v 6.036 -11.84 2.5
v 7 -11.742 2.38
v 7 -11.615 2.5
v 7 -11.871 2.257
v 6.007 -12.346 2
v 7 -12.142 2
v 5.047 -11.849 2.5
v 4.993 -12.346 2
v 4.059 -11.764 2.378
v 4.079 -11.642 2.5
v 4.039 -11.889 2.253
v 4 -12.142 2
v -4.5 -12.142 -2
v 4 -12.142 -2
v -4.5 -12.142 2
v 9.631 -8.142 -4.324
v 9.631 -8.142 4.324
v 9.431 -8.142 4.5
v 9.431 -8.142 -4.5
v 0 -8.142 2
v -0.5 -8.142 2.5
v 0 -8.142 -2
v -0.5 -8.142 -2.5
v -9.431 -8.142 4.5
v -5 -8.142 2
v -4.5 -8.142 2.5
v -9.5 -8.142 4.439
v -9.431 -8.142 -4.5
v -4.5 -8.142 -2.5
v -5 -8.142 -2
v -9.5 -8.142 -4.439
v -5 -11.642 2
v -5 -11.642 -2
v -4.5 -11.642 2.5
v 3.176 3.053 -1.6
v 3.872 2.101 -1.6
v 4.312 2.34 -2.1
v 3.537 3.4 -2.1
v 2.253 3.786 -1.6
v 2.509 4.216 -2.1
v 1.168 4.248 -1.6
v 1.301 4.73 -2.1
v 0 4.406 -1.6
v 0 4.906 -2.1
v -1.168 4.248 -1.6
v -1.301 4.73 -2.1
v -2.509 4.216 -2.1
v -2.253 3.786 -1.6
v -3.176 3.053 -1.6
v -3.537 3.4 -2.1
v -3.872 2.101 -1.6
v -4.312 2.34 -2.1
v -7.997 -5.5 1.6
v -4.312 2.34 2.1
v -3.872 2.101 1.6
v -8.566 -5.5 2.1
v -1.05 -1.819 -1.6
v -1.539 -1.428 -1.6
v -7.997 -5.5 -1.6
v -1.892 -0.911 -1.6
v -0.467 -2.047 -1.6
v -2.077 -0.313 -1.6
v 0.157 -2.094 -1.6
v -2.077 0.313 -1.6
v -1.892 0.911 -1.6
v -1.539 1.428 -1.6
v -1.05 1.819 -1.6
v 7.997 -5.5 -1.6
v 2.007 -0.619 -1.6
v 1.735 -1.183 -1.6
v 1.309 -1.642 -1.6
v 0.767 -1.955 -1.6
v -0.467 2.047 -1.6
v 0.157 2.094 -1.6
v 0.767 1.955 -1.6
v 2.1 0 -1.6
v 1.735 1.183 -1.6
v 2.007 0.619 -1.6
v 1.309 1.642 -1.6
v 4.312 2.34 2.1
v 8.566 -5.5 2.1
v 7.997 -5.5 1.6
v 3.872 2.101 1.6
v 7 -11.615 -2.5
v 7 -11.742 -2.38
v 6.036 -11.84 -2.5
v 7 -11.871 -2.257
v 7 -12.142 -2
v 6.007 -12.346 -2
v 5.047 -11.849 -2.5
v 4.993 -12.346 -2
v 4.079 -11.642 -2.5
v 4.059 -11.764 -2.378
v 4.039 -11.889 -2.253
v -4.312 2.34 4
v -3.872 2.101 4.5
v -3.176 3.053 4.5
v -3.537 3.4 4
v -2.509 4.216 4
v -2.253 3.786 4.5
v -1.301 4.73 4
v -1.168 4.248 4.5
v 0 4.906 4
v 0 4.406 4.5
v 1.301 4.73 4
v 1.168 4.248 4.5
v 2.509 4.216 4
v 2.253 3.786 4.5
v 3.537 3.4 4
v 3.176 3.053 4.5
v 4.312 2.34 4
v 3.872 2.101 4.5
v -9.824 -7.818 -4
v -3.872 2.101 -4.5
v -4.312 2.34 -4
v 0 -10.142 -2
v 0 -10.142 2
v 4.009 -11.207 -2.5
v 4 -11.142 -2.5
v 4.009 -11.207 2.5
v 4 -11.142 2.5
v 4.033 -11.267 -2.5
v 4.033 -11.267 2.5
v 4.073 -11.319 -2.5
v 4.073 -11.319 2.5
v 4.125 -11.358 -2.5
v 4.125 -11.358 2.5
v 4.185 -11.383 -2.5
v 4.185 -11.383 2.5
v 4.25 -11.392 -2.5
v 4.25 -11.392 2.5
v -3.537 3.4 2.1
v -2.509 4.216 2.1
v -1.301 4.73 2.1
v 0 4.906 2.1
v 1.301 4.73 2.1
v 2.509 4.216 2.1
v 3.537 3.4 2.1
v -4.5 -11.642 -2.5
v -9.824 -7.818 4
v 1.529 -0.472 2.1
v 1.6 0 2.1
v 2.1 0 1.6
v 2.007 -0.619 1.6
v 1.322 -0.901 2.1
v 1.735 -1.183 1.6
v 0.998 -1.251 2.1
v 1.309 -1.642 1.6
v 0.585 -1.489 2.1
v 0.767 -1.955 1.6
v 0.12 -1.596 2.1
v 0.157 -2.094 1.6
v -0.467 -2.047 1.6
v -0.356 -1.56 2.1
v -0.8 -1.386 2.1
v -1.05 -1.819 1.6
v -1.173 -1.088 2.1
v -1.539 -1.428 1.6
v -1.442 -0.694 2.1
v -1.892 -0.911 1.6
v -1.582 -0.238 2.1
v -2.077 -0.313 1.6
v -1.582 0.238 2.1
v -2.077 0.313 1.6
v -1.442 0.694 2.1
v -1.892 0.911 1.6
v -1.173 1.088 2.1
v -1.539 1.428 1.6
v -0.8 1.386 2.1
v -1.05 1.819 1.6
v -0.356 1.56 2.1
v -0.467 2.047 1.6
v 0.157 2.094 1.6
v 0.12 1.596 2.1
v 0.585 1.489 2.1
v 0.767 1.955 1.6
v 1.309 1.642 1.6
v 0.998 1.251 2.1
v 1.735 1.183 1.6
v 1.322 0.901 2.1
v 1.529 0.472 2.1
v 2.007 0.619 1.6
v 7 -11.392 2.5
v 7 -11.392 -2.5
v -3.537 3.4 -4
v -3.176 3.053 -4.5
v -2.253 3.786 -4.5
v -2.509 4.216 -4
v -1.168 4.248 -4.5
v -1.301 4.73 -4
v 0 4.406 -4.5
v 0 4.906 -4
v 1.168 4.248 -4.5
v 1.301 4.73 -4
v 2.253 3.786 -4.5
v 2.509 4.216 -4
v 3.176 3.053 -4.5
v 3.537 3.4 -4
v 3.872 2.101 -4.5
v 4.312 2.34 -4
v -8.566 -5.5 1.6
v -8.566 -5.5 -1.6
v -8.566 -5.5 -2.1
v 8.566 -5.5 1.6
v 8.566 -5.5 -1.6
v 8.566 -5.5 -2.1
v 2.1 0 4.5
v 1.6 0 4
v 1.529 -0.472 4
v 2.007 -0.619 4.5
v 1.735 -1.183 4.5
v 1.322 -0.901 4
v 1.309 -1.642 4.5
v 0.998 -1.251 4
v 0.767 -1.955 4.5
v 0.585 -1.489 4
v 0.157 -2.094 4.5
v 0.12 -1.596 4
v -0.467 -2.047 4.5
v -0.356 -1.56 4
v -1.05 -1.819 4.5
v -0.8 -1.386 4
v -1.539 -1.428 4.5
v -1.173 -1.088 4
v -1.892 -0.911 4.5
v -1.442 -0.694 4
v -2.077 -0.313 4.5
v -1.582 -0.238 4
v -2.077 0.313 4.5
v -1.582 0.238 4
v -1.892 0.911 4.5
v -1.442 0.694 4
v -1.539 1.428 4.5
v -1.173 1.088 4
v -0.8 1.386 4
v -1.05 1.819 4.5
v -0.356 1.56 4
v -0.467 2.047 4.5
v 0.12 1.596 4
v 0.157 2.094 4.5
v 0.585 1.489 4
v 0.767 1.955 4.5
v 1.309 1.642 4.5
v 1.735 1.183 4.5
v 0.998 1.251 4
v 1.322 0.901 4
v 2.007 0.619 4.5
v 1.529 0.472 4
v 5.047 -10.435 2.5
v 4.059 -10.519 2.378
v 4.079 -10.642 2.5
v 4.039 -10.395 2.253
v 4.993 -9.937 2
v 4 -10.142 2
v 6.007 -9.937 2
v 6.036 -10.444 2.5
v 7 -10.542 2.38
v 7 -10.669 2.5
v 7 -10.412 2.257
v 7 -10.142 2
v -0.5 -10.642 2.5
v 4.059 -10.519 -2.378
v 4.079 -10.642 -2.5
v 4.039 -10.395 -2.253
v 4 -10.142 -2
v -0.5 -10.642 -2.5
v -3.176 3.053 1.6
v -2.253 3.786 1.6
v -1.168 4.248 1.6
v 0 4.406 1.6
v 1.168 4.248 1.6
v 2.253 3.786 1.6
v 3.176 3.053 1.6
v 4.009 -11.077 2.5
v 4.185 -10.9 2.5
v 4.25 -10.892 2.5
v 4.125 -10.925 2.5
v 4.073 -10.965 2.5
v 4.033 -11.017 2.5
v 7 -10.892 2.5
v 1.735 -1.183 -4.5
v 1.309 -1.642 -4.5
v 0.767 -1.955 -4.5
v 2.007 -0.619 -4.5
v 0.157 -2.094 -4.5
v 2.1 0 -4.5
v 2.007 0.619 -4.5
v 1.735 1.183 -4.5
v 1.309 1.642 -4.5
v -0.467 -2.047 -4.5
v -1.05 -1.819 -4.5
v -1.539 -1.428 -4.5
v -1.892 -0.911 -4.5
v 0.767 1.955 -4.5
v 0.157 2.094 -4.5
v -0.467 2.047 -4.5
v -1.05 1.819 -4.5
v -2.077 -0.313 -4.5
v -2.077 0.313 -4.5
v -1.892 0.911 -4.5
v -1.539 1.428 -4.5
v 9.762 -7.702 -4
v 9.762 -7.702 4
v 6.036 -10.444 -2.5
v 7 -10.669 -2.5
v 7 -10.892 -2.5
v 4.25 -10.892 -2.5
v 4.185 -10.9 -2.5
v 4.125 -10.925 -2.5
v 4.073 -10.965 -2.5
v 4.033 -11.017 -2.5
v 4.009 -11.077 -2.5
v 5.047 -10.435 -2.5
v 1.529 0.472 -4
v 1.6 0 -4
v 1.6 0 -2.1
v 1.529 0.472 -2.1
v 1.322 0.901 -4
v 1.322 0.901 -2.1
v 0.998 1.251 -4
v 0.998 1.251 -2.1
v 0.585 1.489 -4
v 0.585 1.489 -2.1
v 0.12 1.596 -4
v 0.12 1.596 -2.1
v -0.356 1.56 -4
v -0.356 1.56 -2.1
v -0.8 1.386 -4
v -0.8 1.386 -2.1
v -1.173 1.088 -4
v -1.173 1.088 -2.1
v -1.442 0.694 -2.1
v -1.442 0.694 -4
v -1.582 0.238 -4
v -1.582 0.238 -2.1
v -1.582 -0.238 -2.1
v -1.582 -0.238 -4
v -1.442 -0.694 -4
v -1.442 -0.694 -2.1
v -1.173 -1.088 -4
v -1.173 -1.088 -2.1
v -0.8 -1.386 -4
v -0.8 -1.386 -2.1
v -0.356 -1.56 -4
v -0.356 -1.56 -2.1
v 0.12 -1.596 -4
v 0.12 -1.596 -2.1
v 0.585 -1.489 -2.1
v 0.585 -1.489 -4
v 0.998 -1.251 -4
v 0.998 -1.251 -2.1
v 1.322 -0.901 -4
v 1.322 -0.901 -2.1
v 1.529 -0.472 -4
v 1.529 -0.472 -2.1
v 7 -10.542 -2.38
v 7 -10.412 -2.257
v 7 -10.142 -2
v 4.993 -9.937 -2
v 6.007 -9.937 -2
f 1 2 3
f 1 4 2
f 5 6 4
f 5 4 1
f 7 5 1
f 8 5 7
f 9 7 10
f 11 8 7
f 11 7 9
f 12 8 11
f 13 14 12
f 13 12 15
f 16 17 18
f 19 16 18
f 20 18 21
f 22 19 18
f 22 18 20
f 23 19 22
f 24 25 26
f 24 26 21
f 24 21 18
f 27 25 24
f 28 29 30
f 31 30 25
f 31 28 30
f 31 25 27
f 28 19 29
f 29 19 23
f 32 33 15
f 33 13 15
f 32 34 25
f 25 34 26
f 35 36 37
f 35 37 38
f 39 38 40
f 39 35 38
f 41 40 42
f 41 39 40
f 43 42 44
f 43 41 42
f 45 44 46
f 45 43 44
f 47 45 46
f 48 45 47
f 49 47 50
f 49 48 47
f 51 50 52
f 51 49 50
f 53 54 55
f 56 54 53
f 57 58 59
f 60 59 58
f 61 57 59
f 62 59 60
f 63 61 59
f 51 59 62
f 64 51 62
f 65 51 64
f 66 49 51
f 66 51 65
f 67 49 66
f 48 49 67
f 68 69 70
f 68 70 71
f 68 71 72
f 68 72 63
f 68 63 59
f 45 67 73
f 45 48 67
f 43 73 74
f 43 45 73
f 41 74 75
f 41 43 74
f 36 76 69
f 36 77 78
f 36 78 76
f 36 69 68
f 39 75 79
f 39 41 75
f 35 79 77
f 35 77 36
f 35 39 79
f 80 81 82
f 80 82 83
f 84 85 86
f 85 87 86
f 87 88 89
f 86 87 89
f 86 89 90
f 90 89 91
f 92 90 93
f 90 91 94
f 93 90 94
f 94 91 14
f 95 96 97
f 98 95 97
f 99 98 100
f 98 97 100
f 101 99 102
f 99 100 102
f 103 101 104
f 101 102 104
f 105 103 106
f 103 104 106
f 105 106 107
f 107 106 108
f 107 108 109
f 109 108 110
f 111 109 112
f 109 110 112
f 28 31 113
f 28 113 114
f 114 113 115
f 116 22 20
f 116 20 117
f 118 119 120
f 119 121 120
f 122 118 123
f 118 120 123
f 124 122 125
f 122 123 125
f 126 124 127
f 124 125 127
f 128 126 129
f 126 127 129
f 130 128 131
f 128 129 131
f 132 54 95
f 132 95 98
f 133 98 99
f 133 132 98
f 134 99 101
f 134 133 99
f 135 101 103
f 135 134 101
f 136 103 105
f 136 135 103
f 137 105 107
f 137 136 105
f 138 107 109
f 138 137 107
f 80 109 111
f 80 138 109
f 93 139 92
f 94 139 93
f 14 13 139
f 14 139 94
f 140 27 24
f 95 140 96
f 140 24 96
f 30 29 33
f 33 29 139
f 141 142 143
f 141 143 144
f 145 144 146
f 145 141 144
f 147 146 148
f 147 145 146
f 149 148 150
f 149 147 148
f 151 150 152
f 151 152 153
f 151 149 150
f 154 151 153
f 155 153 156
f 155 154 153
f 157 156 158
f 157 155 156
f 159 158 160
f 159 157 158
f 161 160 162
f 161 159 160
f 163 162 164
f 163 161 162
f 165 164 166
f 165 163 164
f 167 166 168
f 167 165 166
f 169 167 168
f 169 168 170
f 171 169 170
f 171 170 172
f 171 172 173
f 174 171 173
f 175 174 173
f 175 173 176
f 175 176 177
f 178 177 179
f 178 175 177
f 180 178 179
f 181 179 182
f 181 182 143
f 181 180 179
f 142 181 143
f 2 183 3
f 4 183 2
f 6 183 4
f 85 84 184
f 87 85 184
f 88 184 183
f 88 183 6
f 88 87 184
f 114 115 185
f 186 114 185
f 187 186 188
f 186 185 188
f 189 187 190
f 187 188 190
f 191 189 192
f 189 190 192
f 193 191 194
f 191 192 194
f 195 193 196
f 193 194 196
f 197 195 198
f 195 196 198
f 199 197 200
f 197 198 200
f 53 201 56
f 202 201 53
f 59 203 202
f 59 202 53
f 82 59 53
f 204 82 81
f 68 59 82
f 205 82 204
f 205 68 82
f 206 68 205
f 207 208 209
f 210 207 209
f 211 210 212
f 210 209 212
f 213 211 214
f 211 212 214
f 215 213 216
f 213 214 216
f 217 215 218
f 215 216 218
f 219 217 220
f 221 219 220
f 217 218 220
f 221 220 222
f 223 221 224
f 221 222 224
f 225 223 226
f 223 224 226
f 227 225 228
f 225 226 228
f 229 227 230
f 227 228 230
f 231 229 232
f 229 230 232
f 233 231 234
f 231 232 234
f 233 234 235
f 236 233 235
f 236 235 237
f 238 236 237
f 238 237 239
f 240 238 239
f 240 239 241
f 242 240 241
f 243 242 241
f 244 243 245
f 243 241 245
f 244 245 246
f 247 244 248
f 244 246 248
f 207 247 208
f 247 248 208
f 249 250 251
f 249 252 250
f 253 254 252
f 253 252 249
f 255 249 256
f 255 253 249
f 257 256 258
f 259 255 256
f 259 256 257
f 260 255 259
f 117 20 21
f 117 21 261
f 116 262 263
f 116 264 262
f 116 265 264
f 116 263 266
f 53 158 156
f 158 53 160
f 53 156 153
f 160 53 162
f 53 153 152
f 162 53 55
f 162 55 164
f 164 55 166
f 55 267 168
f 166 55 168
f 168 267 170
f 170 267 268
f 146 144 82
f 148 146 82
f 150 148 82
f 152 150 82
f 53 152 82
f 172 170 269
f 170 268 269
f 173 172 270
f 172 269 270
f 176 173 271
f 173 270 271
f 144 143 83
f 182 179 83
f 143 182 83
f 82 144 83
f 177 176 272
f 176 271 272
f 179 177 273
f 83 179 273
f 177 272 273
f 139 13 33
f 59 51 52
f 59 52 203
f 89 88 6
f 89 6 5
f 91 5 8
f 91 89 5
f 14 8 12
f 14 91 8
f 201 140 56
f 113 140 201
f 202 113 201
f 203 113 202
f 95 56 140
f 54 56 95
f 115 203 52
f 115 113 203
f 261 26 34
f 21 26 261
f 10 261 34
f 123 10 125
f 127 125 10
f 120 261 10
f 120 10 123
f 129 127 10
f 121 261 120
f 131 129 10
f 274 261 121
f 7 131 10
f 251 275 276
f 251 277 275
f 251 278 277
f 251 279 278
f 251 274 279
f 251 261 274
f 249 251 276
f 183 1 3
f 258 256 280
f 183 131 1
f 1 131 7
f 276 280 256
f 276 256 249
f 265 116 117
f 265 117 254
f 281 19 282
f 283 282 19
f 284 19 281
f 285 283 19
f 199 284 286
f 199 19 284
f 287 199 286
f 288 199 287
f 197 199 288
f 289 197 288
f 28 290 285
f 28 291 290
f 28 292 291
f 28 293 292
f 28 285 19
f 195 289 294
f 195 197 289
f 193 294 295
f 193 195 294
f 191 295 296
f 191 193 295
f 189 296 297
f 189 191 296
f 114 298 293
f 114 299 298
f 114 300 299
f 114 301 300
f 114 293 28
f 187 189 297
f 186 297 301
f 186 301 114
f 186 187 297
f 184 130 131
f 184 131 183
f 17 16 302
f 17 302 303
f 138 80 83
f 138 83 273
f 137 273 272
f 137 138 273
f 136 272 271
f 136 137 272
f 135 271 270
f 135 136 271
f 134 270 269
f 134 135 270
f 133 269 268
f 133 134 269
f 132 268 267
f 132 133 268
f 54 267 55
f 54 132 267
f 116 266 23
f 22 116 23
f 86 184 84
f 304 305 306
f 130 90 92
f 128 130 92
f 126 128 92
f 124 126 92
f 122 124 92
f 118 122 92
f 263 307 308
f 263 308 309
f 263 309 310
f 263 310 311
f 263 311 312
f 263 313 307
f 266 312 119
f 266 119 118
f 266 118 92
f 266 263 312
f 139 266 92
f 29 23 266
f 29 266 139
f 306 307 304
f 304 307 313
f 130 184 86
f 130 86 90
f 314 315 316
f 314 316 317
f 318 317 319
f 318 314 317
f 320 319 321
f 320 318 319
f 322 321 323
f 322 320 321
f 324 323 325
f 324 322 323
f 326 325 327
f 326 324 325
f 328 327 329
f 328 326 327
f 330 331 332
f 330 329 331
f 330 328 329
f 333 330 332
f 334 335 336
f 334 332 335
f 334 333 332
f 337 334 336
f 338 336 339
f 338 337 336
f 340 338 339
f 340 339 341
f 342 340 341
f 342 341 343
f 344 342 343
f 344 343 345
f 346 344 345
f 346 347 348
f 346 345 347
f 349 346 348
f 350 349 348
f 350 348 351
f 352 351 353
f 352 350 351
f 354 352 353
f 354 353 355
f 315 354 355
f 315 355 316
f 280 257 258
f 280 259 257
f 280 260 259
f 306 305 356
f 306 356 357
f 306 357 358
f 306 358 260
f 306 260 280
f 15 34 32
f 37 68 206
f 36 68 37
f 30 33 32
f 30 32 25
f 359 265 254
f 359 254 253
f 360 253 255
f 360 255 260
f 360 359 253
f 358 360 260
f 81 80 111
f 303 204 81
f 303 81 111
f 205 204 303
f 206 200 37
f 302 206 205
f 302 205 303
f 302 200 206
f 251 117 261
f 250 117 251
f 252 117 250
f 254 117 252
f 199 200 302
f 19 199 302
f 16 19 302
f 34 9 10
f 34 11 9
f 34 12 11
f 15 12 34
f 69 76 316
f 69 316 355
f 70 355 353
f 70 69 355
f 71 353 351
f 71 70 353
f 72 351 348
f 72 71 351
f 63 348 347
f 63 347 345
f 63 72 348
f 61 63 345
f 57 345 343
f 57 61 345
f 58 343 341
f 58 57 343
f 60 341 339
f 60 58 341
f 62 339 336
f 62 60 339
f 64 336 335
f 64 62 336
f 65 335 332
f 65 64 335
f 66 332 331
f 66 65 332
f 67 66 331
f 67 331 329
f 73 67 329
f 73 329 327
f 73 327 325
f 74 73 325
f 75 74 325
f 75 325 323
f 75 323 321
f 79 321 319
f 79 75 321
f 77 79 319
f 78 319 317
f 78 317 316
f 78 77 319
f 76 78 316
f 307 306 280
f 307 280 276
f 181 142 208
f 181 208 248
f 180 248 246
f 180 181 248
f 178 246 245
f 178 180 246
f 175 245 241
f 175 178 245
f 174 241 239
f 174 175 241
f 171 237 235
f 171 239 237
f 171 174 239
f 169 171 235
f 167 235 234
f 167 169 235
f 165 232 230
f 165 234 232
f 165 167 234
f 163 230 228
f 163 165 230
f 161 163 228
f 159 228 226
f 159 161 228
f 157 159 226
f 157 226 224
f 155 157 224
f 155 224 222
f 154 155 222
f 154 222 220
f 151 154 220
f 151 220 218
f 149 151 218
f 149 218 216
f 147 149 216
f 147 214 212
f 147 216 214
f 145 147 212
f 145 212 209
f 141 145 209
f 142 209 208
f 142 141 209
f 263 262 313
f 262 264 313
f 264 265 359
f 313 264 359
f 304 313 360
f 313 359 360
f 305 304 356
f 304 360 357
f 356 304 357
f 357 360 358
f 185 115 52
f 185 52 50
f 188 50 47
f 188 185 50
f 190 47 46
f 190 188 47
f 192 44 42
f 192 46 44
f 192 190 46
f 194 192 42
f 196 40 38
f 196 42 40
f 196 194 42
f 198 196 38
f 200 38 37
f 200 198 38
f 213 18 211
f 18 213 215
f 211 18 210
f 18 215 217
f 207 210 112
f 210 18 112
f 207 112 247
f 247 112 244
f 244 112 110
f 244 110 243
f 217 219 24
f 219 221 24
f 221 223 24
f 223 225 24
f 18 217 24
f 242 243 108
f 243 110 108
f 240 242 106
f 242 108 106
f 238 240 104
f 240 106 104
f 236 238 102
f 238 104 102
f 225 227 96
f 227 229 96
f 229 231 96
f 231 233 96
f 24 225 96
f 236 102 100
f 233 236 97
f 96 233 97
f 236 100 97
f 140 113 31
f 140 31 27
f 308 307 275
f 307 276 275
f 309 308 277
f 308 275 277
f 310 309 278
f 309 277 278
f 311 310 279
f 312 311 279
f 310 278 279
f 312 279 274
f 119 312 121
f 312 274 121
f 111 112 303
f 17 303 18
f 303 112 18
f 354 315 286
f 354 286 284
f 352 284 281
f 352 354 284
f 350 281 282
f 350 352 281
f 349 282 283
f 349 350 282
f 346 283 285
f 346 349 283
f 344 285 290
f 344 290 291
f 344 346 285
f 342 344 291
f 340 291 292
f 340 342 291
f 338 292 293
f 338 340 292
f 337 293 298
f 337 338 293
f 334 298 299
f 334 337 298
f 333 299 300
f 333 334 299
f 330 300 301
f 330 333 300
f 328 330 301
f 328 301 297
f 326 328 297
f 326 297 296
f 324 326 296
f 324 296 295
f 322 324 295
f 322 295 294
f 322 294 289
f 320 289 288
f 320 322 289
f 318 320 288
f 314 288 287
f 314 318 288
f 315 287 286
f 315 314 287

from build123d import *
from OCP.BRepFilletAPI import BRepFilletAPI_MakeChamfer

# Parameters (mm, degrees)
BOSS_EXTRUDE1_DEPTH      = 4.5
BOSS_EXTRUDE1_DEPTH_BACK = 4.5
CUT_EXTRUDE1_START       = -6.1
CUT_EXTRUDE1_DEPTH       = 3.2
CUT_EXTRUDE2_DEPTH       = 19.277658975
CUT_EXTRUDE2_DEPTH_BACK  = 19.277658975
SKETCH3_R                = 1.6
SKETCH4_W                = 20
SKETCH4_H                = 4.97497426
CUT_EXTRUDE3_DEPTH       = 2
SKETCH5_W                = 20
SKETCH5_H                = 5.22601356
CUT_EXTRUDE4_DEPTH       = 2
FILLET1_R                = 0.25
CHAMFER1_SIZE            = 0.5
CHAMFER1_SIZE2           = 0.368761208
CHAMFER2_SIZE            = 0.5


with BuildPart() as part:
    # Sketch1 → Boss-Extrude1 (new, two sides: drawn at the far end of the back side and taken through both)
    with BuildSketch(Plane.XY.offset(-BOSS_EXTRUDE1_DEPTH_BACK)):
        with BuildLine():
            Line((-10, -8.141956011), (-4.311694326, 2.339879755))
            ThreePointArc((-4.311694326, 2.339879755), (0, 4.905684991), (4.311694326, 2.339879755))
            Line((4.311694326, 2.339879755), (10, -8.141956011))
            Line((10, -8.141956011), (0, -8.141956011))
            Line((0, -8.141956011), (0, -10.141956011))
            Line((0, -10.141956011), (4, -10.141956011))
            ThreePointArc((4, -10.141956011), (5.5, -9.911652018), (7, -10.141956011))
            Line((7, -10.141956011), (7, -10.891956011))
            Line((7, -10.891956011), (4, -10.891956011))
            Line((4, -10.891956011), (4, -11.391956011))
            Line((4, -11.391956011), (7, -11.391956011))
            Line((7, -11.391956011), (7, -12.141956011))
            ThreePointArc((7, -12.141956011), (5.5, -12.372260004), (4, -12.141956011))
            Line((4, -12.141956011), (-5, -12.141956011))
            Line((-5, -12.141956011), (-5, -8.141956011))
            Line((-5, -8.141956011), (-10, -8.141956011))
        make_face()
    extrude(amount=BOSS_EXTRUDE1_DEPTH + BOSS_EXTRUDE1_DEPTH_BACK)

    # Sketch2 → Cut-Extrude1 (cut)
    with BuildSketch(Plane.XY.offset(4.5).offset(CUT_EXTRUDE1_START)):
        with BuildLine():
            Line((8.566257505, -5.5), (4.311694326, 2.339879755))
            ThreePointArc((4.311694326, 2.339879755), (0, 4.905684991), (-4.311694326, 2.339879755))
            Line((-4.311694326, 2.339879755), (-8.566257505, -5.5))
            Line((-8.566257505, -5.5), (8.566257505, -5.5))
        make_face()
    extrude(amount=CUT_EXTRUDE1_DEPTH, mode=Mode.SUBTRACT)

    # Sketch3 → Cut-Extrude2 (cut, two sides: drawn at the far end of the back side and taken through both)
    with BuildSketch(Plane.XY.offset(4.5).offset(-CUT_EXTRUDE2_DEPTH_BACK)):
        Circle(SKETCH3_R)
    extrude(amount=CUT_EXTRUDE2_DEPTH + CUT_EXTRUDE2_DEPTH_BACK, mode=Mode.SUBTRACT)

    # Sketch4 → Cut-Extrude3 (cut)
    with BuildSketch(Plane.XY.offset(4.5)):
        with Locations((0, -10.629443141)):
            Rectangle(SKETCH4_W, SKETCH4_H)
    extrude(amount=-CUT_EXTRUDE3_DEPTH, mode=Mode.SUBTRACT)

    # Sketch5 → Cut-Extrude4 (cut)
    with BuildSketch(Plane(origin=(0, 0, -4.5), x_dir=(-1, 0, 0), z_dir=(0, 0, -1))):
        with Locations((0, -10.754962791)):
            Rectangle(SKETCH5_W, SKETCH5_H)
    extrude(amount=-CUT_EXTRUDE4_DEPTH, mode=Mode.SUBTRACT)

    # Fillet1
    fillet1_edges = [part.edges().sort_by_distance(p)[0] for p in [
        (4, -11.391956011, 0),
        (4, -10.891956011, 0),
    ]]
    fillet(fillet1_edges, radius=FILLET1_R - 0.0001)  # a hair under: the kernel refuses the full size

    # Chamfer1: one chamfer whose edges measure the first distance from different faces: ONE call of the kernel's chamfer builder (chamfer() names one face for all edges)
    chamfer1_edges_1 = [part.edges().sort_by_distance(p)[0] for p in [
        (-10, -8.141956011, 0),
    ]]
    chamfer1_side_1 = [part.faces().sort_by_distance(p)[0] for p in [
        (0.403225806, -8.141956011, 0),
    ]]
    chamfer1_edges_2 = [part.edges().sort_by_distance(p)[0] for p in [
        (10, -8.141956011, 0),
    ]]
    chamfer1_side_2 = [part.faces().sort_by_distance(p)[0] for p in [
        (4.382957635, 2.20856292, 3.05),
    ]]
    chamfer1_edges_3 = [part.edges().sort_by_distance(p)[0] for p in [
        (7.155847163, -2.901038128, -4.5),
        (0, 4.905684991, -4.5),
        (7.155847163, -2.901038128, 4.5),
        (0, 4.905684991, 4.5),
        (-7.155847163, -2.901038128, 4.5),
        (-7.155847163, -2.901038128, -4.5),
        (0, 4.905684991, -1.6),
        (6.438975915, -1.580060123, -1.6),
        (-6.438975915, -1.580060123, -1.6),
        (0, 4.905684991, 1.6),
        (-6.438975915, -1.580060123, 1.6),
        (6.438975915, -1.580060123, 1.6),
        (-1.6, 0, 1.6),
        (-1.6, 0, 4.5),
        (-1.6, 0, -1.6),
        (-1.6, 0, -4.5),
    ]]
    chamfer1 = BRepFilletAPI_MakeChamfer(part.part.solid().wrapped)
    for e in chamfer1_edges_1:
        chamfer1.Add(CHAMFER1_SIZE, CHAMFER1_SIZE2, e.wrapped, chamfer1_side_1[0].wrapped)  # the first distance lies on this face
    for e in chamfer1_edges_2:
        chamfer1.Add(CHAMFER1_SIZE, CHAMFER1_SIZE2, e.wrapped, chamfer1_side_2[0].wrapped)  # the first distance lies on this face
    for e in chamfer1_edges_3:
        chamfer1.Add(CHAMFER1_SIZE, e.wrapped)
    add(Compound.cast(chamfer1.Shape()), mode=Mode.REPLACE)

    # Chamfer2
    chamfer2_edges = [part.edges().sort_by_distance(p)[0] for p in [
        (-5, -10.141956011, 2.5),
        (0, -9.141956011, 2.5),
        (2, -10.141956011, 2.5),
        (5.5, -9.911652018, 2.5),
        (5.5, -12.372260004, 2.5),
        (-0.5, -12.141956011, 2.5),
        (-5, -12.141956011, 0),
        (0, -9.141956011, -2.5),
        (2, -10.141956011, -2.5),
        (5.5, -9.911652018, -2.5),
        (5.5, -12.372260004, -2.5),
        (-0.5, -12.141956011, -2.5),
        (-5, -10.141956011, -2.5),
    ]]
    chamfer(chamfer2_edges, length=CHAMFER2_SIZE)


solid = part.part
